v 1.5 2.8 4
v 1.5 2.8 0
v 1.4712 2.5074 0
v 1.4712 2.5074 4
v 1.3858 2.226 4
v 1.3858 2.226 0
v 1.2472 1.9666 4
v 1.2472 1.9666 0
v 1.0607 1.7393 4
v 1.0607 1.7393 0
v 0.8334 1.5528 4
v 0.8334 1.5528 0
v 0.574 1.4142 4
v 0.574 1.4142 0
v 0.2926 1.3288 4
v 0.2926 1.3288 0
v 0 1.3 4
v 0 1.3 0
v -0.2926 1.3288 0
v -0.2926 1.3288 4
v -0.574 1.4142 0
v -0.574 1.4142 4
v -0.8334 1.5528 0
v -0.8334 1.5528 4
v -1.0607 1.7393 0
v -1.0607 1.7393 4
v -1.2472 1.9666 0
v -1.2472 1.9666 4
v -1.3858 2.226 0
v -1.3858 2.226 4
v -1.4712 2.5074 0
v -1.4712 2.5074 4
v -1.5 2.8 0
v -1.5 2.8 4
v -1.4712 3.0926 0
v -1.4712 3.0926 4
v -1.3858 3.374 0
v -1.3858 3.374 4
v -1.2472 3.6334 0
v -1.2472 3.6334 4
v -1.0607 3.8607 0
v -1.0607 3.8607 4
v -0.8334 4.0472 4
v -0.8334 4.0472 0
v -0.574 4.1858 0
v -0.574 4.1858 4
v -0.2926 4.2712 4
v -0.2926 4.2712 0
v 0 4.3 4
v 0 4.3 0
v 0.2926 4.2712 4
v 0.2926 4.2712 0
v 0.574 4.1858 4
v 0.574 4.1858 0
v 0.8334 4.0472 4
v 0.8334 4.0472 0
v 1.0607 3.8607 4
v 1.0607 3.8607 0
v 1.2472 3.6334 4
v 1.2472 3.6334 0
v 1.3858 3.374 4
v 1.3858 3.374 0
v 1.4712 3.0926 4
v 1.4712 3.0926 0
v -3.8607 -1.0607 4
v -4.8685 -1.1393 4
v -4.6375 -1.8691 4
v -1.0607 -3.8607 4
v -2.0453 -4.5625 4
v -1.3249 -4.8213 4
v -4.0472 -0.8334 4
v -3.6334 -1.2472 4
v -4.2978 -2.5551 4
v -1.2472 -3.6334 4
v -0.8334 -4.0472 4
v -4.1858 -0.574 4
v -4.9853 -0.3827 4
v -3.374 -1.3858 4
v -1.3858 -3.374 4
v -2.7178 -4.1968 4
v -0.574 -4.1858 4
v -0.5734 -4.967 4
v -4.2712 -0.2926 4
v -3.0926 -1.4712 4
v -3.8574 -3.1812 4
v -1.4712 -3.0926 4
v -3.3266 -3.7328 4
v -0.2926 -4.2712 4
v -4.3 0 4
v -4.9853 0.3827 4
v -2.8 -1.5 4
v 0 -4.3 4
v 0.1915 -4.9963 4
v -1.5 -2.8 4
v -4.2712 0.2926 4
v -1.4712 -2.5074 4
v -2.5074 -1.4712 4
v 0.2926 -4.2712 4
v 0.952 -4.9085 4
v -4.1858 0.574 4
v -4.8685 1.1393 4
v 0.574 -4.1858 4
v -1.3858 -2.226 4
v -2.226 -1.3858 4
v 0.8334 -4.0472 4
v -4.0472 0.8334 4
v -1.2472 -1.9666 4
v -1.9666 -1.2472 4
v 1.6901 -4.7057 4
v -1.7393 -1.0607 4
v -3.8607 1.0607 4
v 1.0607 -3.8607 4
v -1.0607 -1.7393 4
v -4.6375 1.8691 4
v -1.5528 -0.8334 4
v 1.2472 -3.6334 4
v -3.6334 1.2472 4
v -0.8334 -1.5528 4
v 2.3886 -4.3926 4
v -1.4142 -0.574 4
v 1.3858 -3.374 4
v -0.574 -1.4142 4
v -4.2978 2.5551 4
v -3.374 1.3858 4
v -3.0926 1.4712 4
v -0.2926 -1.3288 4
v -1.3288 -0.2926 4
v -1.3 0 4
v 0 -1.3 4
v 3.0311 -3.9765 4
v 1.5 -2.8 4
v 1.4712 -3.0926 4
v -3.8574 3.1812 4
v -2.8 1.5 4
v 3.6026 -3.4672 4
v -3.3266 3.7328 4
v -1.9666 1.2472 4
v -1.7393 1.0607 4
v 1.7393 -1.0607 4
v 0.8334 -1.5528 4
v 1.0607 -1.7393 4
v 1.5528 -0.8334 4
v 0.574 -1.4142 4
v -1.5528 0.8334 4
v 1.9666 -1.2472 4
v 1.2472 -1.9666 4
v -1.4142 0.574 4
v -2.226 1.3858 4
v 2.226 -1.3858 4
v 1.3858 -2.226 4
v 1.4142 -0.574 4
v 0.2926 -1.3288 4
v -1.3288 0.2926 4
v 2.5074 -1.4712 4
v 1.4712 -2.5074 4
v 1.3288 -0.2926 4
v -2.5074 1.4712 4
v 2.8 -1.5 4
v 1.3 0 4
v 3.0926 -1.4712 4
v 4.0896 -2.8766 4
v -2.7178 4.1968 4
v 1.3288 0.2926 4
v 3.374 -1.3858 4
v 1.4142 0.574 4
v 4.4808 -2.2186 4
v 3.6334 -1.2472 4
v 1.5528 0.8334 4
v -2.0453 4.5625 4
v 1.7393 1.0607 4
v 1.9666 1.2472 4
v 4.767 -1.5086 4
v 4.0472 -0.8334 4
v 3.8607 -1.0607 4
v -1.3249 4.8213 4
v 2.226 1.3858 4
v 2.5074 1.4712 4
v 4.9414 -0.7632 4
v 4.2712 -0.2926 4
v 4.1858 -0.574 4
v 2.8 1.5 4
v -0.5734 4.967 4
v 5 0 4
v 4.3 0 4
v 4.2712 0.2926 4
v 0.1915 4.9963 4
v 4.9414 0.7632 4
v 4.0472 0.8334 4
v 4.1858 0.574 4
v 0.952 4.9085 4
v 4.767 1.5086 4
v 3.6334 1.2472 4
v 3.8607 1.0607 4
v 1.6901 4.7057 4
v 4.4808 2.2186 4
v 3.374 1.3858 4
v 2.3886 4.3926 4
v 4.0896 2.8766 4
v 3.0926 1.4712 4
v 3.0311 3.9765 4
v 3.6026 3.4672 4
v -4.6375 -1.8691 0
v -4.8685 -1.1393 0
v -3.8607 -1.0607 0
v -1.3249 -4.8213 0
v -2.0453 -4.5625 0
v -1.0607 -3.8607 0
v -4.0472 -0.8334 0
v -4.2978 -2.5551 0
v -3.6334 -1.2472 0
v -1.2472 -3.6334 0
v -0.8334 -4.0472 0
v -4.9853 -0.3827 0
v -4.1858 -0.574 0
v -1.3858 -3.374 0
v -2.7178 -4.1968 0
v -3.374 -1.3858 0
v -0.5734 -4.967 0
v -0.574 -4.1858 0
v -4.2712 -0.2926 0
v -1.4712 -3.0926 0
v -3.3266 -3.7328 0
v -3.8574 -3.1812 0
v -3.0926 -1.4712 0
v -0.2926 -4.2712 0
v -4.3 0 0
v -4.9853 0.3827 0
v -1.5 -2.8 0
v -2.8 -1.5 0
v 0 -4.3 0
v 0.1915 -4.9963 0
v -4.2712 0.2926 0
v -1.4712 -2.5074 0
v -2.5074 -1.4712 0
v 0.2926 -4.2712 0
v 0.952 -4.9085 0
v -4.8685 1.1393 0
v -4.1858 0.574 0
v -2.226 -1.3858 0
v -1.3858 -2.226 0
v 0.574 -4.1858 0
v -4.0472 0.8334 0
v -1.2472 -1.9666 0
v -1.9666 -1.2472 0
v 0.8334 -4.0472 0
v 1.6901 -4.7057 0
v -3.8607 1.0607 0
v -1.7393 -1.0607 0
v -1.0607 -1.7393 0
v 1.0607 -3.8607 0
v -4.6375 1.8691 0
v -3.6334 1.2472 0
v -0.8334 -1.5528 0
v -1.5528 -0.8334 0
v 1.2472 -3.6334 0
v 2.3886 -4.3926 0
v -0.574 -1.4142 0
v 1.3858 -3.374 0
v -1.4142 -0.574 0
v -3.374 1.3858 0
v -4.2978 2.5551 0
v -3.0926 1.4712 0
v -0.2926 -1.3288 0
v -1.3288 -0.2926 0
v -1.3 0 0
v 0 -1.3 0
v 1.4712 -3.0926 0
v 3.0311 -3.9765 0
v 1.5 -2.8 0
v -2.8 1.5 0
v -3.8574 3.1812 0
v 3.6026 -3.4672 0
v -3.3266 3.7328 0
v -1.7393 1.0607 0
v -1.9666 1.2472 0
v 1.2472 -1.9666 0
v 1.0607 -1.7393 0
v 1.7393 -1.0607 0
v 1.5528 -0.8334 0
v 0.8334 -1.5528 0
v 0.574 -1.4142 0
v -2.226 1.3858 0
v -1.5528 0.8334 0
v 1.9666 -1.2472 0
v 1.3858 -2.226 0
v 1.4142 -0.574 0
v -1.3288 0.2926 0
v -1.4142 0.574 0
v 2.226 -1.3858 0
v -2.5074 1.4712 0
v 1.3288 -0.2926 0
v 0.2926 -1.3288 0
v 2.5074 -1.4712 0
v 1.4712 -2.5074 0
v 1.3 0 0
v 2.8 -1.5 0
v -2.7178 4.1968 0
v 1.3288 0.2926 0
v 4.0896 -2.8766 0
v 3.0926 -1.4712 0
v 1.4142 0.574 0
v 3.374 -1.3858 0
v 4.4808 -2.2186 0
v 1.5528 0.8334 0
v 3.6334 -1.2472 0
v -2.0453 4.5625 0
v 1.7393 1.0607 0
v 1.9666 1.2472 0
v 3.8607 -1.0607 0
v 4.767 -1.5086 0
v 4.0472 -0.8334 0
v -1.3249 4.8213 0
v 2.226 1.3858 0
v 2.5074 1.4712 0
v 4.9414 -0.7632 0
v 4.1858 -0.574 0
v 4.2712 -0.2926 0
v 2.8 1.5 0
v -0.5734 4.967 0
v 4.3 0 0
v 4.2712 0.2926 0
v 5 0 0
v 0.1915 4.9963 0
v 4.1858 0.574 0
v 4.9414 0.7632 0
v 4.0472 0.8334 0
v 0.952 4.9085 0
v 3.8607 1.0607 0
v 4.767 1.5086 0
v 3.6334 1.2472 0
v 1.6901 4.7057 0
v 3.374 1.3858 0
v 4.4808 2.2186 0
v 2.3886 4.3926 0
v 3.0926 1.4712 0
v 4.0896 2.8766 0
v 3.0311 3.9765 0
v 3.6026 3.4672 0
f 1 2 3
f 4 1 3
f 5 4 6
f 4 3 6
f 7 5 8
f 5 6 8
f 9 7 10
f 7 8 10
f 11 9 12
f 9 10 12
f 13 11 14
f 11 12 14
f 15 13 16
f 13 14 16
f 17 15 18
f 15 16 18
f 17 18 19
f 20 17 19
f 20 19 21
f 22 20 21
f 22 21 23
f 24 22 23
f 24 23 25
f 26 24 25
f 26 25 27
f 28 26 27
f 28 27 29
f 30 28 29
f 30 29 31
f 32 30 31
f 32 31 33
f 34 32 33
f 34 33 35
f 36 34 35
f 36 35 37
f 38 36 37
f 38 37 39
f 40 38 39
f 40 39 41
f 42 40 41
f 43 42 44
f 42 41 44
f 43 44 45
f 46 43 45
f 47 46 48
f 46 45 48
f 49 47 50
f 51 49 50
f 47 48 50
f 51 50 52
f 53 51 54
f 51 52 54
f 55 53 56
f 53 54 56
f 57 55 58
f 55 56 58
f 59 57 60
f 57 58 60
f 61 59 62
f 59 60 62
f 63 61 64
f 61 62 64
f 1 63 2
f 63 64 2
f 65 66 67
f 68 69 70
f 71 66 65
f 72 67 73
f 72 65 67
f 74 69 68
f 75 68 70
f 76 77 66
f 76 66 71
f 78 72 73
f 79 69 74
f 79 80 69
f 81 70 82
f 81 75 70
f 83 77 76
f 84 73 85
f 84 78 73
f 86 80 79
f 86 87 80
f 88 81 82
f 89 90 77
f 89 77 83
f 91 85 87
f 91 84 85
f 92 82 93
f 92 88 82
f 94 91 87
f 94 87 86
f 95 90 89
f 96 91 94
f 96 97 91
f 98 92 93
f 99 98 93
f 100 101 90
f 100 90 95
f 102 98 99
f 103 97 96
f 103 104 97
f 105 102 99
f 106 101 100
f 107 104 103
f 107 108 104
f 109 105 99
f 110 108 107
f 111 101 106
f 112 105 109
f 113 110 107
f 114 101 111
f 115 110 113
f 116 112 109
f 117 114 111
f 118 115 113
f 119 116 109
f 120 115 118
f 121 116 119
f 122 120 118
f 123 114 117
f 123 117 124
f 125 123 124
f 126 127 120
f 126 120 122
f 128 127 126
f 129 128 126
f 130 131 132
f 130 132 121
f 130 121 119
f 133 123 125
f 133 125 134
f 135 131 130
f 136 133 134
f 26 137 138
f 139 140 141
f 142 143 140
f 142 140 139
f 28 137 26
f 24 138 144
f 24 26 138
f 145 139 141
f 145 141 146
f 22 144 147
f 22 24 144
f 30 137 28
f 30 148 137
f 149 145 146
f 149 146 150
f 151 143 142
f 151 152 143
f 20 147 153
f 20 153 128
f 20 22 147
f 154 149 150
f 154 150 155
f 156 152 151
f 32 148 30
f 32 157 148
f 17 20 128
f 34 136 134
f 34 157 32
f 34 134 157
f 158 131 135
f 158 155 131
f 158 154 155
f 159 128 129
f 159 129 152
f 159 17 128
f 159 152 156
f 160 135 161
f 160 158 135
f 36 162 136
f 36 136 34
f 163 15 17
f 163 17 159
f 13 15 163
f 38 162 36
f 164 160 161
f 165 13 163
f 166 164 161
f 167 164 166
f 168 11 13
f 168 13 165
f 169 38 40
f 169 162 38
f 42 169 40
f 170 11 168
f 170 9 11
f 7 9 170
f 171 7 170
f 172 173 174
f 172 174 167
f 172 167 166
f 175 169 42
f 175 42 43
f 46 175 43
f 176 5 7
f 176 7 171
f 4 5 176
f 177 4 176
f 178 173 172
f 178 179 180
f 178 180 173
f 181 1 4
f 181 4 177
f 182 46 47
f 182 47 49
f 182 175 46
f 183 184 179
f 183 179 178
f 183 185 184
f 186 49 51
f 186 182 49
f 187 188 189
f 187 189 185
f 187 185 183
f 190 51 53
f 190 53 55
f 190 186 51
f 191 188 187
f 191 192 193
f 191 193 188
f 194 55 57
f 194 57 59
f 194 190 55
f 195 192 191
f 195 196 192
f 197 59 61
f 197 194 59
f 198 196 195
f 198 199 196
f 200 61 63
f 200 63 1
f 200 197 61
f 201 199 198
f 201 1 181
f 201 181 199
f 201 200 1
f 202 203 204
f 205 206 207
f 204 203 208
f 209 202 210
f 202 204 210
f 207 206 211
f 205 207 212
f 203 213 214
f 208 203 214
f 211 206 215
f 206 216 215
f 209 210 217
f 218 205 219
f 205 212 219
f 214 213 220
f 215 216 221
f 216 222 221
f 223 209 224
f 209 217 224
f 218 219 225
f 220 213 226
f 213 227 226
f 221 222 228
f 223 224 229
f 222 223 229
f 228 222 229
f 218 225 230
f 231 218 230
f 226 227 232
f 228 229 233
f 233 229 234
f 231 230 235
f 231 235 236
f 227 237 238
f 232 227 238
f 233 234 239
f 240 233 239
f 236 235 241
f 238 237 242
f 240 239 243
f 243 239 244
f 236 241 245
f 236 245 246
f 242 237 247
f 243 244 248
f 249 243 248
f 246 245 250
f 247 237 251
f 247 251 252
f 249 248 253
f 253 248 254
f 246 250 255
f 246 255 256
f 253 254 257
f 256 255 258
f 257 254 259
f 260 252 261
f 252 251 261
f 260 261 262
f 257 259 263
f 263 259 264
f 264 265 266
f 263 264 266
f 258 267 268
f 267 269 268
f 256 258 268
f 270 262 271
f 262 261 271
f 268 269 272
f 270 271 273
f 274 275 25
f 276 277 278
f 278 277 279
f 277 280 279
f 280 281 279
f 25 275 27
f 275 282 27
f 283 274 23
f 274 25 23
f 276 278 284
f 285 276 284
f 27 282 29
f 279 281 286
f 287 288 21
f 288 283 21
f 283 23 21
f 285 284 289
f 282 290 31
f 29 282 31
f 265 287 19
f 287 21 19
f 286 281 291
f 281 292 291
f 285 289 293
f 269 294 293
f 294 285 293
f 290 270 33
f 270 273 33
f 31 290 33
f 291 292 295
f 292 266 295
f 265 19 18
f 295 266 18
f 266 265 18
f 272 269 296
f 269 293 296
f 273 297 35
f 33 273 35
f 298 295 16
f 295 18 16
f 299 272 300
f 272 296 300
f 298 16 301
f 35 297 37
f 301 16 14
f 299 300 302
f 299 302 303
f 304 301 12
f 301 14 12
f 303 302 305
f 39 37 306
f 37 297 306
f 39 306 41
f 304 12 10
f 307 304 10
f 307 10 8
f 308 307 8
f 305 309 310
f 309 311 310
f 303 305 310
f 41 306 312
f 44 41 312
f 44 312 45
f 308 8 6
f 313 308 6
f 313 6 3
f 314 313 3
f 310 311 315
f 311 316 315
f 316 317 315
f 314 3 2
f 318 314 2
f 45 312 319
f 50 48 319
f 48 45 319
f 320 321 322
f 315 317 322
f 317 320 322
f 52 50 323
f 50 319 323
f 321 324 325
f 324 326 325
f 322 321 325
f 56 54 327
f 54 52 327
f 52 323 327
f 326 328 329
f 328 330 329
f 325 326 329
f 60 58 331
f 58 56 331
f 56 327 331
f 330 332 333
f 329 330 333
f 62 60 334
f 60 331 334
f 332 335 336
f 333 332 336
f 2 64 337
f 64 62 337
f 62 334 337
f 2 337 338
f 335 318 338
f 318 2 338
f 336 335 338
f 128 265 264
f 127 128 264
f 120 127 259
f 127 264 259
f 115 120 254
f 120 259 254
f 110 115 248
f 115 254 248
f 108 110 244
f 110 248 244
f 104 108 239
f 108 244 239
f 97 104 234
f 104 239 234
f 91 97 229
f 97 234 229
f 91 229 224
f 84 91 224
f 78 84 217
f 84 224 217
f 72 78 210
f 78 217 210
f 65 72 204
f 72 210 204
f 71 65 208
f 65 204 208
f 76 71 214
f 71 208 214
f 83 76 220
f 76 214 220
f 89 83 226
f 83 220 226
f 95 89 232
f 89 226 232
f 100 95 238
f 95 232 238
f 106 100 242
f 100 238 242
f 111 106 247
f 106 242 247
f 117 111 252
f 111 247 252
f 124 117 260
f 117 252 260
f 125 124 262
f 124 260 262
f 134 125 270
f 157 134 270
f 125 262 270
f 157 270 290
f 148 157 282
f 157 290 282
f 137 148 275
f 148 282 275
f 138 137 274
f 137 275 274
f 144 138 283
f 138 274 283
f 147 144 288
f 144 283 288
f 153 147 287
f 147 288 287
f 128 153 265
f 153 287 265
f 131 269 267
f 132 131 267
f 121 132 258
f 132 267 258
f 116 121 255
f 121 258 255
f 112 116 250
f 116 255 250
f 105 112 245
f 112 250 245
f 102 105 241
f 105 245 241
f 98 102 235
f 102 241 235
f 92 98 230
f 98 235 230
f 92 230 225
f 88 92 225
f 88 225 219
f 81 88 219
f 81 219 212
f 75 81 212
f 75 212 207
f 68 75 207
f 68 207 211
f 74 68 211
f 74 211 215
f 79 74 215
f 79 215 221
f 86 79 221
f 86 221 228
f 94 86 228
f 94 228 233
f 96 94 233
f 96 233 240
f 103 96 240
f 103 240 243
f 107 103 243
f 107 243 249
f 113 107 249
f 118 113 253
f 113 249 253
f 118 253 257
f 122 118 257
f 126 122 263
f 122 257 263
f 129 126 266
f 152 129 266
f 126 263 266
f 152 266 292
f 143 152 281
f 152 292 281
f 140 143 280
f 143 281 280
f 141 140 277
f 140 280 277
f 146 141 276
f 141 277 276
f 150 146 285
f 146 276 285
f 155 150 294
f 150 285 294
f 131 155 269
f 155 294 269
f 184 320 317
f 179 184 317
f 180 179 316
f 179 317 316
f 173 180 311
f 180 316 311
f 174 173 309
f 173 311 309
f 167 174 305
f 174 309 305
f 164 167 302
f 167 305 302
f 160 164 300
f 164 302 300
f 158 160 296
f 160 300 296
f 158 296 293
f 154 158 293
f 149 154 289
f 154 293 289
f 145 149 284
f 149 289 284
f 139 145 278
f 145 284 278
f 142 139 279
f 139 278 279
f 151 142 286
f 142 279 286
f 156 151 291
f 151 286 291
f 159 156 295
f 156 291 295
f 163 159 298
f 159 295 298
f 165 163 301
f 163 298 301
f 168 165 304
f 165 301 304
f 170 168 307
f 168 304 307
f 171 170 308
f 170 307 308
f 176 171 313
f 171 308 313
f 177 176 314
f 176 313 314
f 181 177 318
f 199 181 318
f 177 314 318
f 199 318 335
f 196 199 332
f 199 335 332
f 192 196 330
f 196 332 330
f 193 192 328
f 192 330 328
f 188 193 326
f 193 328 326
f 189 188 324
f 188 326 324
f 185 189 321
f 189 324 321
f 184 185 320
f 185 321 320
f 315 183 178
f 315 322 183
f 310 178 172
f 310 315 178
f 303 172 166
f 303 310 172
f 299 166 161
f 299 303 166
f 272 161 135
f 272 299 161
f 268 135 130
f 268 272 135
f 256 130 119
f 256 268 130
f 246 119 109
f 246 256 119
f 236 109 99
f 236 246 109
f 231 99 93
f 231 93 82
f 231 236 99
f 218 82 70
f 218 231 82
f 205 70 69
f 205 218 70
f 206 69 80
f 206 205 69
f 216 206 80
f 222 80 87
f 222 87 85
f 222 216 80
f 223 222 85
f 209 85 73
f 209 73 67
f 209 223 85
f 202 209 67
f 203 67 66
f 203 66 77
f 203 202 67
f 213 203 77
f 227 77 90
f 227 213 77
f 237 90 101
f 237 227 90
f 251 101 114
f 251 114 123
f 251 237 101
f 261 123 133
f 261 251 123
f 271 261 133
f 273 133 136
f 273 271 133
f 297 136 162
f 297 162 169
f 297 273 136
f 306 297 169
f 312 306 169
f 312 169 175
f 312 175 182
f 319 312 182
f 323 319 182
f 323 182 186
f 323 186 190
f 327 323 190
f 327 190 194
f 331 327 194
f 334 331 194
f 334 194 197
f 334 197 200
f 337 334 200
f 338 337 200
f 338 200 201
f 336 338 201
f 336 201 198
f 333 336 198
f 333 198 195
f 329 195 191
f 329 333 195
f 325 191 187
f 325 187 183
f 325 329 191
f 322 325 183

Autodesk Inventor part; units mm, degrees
ref_plane "YZ Plane" through (0, 0, 0) normal (1, 0, 0) x (0, 1, 0)
ref_plane "XZ Plane" through (0, 0, 0) normal (0, 1, 0) x (-1, 0, 0)
ref_plane "XY Plane" through (0, 0, 0) normal (0, 0, 1) x (1, 0, 0)
sketch "スケッチ1" plane through (0, 0, 0) normal (0, 0, 1) x (1, 0, 0)
  circle A0 centre (2.8, 0) radius 2.8
  line L0 (2.8, 0) -> (0, 0)
  circle A1 centre (0, 2.8) radius 2.8
  circle A2 centre (-2.8, 0) radius 2.8
  circle A3 centre (0, -2.8) radius 2.8
  circle A4 centre (2.8, 0) radius 1.5
  circle A5 centre (0, 2.8) radius 1.5
  circle A6 centre (-2.8, 0) radius 1.5
  circle A7 centre (0, -2.8) radius 1.5
  circle A8 centre (0, 0) radius 5
  circle A9 centre (0, 5) radius 1.5
  circle A10 centre (-5, 0) radius 1.5
  circle A11 centre (0, -5) radius 1.5
  circle A12 centre (5, 0) radius 1.5
  point P0 (-1.483, -4.775)
  point P1 (1.483, -4.775)
  point P2 (-4.775, -1.483)
  point P3 (-4.775, 1.483)
  point P4 (4.775, 1.483)
  point P5 (4.775, -1.483)
  point P6 (-1.483, 4.775)
  point P7 (1.483, 4.775)
  dimension "d12" = 10
  dimension "d1" = 5.6
  dimension "d4" = 360
  dimension "d7" = 3
  dimension "d10" = 360
  dimension "d15" = 3
  dimension "d18" = 360
extrude "押し出し1" add sketch "スケッチ1" along normal blind 4 contours A8 A12 A4 A1 A0 | A0 A1 A8 | A8 A12 A4 | A8 A3 A0 | A0 A3 A4 A12 A8 | A1 A4 A0 A5 | A0 A5 A9 A8 A1 | A3 A8 A11 A7 A0 | A0 A7 A3 A4 | A9 A5 A8 | A8 A11 A7 | A0 A2 A5 | A4 L0 A1 | A9 A5 A2 A1 A8 | A7 A2 A0 | A3 L0 A4 | A8 A3 A2 A7 A11 | A3 A6 A1 | A1 A6 A2 A5 | A2 A7 A3 A6 | A1 A2 A8 | A8 A2 A3 | A1 A6 A10 A8 A2 | A2 A8 A10 A6 A3 | A10 A6 A8
properties part number "カムL4" material "アセタール樹脂、白"
